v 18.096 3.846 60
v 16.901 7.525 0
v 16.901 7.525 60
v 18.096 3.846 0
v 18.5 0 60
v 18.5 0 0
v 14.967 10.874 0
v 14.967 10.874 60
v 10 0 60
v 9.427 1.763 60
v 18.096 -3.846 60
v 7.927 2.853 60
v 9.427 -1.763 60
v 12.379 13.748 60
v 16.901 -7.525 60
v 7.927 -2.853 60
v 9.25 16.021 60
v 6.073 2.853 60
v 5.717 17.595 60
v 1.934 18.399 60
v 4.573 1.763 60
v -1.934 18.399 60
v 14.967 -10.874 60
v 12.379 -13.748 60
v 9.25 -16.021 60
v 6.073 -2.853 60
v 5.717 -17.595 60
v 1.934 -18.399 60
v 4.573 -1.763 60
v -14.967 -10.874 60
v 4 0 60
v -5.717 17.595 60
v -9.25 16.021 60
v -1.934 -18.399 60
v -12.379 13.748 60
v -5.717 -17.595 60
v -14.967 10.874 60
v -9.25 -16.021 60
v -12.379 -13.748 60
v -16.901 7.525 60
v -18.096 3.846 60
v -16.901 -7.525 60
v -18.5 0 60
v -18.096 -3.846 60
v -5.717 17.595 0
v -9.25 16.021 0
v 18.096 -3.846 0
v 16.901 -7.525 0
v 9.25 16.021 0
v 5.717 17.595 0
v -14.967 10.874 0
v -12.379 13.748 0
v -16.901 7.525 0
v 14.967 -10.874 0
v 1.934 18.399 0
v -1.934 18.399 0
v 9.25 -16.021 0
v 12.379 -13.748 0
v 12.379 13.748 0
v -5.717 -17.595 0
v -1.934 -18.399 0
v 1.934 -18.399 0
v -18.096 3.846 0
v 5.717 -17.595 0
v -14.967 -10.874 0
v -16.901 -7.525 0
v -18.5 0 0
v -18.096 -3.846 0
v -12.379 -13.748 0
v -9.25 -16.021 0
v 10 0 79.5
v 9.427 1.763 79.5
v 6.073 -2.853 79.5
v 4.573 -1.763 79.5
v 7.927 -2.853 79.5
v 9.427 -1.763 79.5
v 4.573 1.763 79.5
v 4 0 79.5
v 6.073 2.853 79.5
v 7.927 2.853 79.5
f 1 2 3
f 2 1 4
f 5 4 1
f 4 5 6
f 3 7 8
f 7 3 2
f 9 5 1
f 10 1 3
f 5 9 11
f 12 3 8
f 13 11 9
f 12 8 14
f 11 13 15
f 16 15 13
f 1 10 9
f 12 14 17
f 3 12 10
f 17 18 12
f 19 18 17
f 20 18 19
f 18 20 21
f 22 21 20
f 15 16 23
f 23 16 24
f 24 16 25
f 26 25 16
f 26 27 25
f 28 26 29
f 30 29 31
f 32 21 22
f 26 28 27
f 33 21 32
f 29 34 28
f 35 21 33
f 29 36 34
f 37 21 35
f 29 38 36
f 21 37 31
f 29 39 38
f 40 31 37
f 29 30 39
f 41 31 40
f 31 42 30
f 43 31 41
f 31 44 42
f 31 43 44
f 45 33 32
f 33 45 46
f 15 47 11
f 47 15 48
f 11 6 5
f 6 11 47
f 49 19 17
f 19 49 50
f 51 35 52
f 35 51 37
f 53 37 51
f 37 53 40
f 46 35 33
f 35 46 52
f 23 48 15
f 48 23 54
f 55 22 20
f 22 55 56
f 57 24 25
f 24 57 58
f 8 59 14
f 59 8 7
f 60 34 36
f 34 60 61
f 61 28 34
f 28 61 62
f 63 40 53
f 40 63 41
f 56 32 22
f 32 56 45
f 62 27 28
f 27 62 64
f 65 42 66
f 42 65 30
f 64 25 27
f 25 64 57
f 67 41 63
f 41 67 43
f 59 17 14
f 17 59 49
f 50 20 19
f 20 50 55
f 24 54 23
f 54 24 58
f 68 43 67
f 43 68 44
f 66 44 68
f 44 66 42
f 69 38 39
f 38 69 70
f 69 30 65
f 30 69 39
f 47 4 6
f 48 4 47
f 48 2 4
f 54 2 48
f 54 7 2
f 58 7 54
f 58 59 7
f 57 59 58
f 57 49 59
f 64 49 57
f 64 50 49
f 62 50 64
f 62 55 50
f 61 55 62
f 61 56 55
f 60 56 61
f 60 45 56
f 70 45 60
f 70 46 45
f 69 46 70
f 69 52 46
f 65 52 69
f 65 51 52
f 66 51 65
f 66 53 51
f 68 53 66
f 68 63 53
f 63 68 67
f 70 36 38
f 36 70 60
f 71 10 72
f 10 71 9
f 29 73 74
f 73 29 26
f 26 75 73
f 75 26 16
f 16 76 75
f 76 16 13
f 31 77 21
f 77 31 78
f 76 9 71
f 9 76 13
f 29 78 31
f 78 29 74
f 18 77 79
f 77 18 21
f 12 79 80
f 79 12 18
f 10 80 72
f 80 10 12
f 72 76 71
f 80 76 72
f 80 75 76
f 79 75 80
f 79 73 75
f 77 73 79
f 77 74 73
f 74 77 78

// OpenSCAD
/*
    Proxymow Mower - Purchased parts
    Don't Print - just for illustration

*/
module wheel_flange() {
    major_dia = 32;
    minor_dia = 16;
    hole_dia = 10;
    fix_hole_span = 24;//mm
    fix_hole_dia = 3.9;//mm
    grub_hole_dia = 3;
    thickness = 3;
    height = 13;
    difference() {
        union() {
            cylinder(h=thickness, d=major_dia, $fn=32);
            cylinder(h=height, d=minor_dia, $fn=32);
        }
        //central hole
        cylinder(h=height + 2, d=hole_dia, $fn=32);
        
        //fixing holes
        for(i = [0 : 90 : 360])
         rotate(i) translate([0, -fix_hole_span/2, -1]) cylinder(h=thickness+2, d=fix_hole_dia, $fn=32);
        
        //grub hole
        translate([0, 0, height/2]) rotate([0, 90, 45]) cylinder(h=minor_dia + 2, d=grub_hole_dia, $fn=32, center=true);
        
    }
}
module cutter_flange() {
    major_dia = 22;
    minor_dia = 11;
    hole_dia = 5;
    fix_hole_span = 16;//mm
    fix_hole_dia = 3.0;//mm
    grub_hole_dia = 3;
    thickness = 2;
    height = 12;
    difference() {
        union() {
            cylinder(h=thickness, d=major_dia, $fn=32);
            cylinder(h=height, d=minor_dia, $fn=32);
        }
        //central hole
        cylinder(h=height + 2, d=hole_dia, $fn=32);
        
        //fixing holes
        for(i = [0 : 90 : 360])
         rotate(i) translate([0, -fix_hole_span/2, -1]) cylinder(h=thickness+2, d=fix_hole_dia, $fn=32);
        
        //grub hole
        translate([0, 0, height/2]) rotate([0, 90, 45]) cylinder(h=minor_dia + 2, d=grub_hole_dia, $fn=32, center=true);
        
    }
}
module hinge() {
    difference() {
        cube([80, 100, 0.25], center=true);
        translate([20, 30, 1]) cylinder(h=3, d=4.5, center=true, $fn=32);
        translate([20, -30, 1]) cylinder(h=3, d=4.5, center=true, $fn=32);
        translate([-20, 30, 1]) cylinder(h=3, d=4.5, center=true, $fn=32);
        translate([-20, -30, 1]) cylinder(h=3, d=4.5, center=true, $fn=32);
    }
}
module battery_7ah() {
    cube([151, 65, 102]);//incl terminals
}
module drive_motor() {
    cylinder(h=60, d=37);
    rotate([0, 0, 180]) translate([-7, 0, 60]) cylinder(h=19.5, d=6);    
}
module cutter_motor() {
    cylinder(h=77, d=45);
    translate([0, 0, -21]) cylinder(h=98, d=5);    
}
drive_motor();
